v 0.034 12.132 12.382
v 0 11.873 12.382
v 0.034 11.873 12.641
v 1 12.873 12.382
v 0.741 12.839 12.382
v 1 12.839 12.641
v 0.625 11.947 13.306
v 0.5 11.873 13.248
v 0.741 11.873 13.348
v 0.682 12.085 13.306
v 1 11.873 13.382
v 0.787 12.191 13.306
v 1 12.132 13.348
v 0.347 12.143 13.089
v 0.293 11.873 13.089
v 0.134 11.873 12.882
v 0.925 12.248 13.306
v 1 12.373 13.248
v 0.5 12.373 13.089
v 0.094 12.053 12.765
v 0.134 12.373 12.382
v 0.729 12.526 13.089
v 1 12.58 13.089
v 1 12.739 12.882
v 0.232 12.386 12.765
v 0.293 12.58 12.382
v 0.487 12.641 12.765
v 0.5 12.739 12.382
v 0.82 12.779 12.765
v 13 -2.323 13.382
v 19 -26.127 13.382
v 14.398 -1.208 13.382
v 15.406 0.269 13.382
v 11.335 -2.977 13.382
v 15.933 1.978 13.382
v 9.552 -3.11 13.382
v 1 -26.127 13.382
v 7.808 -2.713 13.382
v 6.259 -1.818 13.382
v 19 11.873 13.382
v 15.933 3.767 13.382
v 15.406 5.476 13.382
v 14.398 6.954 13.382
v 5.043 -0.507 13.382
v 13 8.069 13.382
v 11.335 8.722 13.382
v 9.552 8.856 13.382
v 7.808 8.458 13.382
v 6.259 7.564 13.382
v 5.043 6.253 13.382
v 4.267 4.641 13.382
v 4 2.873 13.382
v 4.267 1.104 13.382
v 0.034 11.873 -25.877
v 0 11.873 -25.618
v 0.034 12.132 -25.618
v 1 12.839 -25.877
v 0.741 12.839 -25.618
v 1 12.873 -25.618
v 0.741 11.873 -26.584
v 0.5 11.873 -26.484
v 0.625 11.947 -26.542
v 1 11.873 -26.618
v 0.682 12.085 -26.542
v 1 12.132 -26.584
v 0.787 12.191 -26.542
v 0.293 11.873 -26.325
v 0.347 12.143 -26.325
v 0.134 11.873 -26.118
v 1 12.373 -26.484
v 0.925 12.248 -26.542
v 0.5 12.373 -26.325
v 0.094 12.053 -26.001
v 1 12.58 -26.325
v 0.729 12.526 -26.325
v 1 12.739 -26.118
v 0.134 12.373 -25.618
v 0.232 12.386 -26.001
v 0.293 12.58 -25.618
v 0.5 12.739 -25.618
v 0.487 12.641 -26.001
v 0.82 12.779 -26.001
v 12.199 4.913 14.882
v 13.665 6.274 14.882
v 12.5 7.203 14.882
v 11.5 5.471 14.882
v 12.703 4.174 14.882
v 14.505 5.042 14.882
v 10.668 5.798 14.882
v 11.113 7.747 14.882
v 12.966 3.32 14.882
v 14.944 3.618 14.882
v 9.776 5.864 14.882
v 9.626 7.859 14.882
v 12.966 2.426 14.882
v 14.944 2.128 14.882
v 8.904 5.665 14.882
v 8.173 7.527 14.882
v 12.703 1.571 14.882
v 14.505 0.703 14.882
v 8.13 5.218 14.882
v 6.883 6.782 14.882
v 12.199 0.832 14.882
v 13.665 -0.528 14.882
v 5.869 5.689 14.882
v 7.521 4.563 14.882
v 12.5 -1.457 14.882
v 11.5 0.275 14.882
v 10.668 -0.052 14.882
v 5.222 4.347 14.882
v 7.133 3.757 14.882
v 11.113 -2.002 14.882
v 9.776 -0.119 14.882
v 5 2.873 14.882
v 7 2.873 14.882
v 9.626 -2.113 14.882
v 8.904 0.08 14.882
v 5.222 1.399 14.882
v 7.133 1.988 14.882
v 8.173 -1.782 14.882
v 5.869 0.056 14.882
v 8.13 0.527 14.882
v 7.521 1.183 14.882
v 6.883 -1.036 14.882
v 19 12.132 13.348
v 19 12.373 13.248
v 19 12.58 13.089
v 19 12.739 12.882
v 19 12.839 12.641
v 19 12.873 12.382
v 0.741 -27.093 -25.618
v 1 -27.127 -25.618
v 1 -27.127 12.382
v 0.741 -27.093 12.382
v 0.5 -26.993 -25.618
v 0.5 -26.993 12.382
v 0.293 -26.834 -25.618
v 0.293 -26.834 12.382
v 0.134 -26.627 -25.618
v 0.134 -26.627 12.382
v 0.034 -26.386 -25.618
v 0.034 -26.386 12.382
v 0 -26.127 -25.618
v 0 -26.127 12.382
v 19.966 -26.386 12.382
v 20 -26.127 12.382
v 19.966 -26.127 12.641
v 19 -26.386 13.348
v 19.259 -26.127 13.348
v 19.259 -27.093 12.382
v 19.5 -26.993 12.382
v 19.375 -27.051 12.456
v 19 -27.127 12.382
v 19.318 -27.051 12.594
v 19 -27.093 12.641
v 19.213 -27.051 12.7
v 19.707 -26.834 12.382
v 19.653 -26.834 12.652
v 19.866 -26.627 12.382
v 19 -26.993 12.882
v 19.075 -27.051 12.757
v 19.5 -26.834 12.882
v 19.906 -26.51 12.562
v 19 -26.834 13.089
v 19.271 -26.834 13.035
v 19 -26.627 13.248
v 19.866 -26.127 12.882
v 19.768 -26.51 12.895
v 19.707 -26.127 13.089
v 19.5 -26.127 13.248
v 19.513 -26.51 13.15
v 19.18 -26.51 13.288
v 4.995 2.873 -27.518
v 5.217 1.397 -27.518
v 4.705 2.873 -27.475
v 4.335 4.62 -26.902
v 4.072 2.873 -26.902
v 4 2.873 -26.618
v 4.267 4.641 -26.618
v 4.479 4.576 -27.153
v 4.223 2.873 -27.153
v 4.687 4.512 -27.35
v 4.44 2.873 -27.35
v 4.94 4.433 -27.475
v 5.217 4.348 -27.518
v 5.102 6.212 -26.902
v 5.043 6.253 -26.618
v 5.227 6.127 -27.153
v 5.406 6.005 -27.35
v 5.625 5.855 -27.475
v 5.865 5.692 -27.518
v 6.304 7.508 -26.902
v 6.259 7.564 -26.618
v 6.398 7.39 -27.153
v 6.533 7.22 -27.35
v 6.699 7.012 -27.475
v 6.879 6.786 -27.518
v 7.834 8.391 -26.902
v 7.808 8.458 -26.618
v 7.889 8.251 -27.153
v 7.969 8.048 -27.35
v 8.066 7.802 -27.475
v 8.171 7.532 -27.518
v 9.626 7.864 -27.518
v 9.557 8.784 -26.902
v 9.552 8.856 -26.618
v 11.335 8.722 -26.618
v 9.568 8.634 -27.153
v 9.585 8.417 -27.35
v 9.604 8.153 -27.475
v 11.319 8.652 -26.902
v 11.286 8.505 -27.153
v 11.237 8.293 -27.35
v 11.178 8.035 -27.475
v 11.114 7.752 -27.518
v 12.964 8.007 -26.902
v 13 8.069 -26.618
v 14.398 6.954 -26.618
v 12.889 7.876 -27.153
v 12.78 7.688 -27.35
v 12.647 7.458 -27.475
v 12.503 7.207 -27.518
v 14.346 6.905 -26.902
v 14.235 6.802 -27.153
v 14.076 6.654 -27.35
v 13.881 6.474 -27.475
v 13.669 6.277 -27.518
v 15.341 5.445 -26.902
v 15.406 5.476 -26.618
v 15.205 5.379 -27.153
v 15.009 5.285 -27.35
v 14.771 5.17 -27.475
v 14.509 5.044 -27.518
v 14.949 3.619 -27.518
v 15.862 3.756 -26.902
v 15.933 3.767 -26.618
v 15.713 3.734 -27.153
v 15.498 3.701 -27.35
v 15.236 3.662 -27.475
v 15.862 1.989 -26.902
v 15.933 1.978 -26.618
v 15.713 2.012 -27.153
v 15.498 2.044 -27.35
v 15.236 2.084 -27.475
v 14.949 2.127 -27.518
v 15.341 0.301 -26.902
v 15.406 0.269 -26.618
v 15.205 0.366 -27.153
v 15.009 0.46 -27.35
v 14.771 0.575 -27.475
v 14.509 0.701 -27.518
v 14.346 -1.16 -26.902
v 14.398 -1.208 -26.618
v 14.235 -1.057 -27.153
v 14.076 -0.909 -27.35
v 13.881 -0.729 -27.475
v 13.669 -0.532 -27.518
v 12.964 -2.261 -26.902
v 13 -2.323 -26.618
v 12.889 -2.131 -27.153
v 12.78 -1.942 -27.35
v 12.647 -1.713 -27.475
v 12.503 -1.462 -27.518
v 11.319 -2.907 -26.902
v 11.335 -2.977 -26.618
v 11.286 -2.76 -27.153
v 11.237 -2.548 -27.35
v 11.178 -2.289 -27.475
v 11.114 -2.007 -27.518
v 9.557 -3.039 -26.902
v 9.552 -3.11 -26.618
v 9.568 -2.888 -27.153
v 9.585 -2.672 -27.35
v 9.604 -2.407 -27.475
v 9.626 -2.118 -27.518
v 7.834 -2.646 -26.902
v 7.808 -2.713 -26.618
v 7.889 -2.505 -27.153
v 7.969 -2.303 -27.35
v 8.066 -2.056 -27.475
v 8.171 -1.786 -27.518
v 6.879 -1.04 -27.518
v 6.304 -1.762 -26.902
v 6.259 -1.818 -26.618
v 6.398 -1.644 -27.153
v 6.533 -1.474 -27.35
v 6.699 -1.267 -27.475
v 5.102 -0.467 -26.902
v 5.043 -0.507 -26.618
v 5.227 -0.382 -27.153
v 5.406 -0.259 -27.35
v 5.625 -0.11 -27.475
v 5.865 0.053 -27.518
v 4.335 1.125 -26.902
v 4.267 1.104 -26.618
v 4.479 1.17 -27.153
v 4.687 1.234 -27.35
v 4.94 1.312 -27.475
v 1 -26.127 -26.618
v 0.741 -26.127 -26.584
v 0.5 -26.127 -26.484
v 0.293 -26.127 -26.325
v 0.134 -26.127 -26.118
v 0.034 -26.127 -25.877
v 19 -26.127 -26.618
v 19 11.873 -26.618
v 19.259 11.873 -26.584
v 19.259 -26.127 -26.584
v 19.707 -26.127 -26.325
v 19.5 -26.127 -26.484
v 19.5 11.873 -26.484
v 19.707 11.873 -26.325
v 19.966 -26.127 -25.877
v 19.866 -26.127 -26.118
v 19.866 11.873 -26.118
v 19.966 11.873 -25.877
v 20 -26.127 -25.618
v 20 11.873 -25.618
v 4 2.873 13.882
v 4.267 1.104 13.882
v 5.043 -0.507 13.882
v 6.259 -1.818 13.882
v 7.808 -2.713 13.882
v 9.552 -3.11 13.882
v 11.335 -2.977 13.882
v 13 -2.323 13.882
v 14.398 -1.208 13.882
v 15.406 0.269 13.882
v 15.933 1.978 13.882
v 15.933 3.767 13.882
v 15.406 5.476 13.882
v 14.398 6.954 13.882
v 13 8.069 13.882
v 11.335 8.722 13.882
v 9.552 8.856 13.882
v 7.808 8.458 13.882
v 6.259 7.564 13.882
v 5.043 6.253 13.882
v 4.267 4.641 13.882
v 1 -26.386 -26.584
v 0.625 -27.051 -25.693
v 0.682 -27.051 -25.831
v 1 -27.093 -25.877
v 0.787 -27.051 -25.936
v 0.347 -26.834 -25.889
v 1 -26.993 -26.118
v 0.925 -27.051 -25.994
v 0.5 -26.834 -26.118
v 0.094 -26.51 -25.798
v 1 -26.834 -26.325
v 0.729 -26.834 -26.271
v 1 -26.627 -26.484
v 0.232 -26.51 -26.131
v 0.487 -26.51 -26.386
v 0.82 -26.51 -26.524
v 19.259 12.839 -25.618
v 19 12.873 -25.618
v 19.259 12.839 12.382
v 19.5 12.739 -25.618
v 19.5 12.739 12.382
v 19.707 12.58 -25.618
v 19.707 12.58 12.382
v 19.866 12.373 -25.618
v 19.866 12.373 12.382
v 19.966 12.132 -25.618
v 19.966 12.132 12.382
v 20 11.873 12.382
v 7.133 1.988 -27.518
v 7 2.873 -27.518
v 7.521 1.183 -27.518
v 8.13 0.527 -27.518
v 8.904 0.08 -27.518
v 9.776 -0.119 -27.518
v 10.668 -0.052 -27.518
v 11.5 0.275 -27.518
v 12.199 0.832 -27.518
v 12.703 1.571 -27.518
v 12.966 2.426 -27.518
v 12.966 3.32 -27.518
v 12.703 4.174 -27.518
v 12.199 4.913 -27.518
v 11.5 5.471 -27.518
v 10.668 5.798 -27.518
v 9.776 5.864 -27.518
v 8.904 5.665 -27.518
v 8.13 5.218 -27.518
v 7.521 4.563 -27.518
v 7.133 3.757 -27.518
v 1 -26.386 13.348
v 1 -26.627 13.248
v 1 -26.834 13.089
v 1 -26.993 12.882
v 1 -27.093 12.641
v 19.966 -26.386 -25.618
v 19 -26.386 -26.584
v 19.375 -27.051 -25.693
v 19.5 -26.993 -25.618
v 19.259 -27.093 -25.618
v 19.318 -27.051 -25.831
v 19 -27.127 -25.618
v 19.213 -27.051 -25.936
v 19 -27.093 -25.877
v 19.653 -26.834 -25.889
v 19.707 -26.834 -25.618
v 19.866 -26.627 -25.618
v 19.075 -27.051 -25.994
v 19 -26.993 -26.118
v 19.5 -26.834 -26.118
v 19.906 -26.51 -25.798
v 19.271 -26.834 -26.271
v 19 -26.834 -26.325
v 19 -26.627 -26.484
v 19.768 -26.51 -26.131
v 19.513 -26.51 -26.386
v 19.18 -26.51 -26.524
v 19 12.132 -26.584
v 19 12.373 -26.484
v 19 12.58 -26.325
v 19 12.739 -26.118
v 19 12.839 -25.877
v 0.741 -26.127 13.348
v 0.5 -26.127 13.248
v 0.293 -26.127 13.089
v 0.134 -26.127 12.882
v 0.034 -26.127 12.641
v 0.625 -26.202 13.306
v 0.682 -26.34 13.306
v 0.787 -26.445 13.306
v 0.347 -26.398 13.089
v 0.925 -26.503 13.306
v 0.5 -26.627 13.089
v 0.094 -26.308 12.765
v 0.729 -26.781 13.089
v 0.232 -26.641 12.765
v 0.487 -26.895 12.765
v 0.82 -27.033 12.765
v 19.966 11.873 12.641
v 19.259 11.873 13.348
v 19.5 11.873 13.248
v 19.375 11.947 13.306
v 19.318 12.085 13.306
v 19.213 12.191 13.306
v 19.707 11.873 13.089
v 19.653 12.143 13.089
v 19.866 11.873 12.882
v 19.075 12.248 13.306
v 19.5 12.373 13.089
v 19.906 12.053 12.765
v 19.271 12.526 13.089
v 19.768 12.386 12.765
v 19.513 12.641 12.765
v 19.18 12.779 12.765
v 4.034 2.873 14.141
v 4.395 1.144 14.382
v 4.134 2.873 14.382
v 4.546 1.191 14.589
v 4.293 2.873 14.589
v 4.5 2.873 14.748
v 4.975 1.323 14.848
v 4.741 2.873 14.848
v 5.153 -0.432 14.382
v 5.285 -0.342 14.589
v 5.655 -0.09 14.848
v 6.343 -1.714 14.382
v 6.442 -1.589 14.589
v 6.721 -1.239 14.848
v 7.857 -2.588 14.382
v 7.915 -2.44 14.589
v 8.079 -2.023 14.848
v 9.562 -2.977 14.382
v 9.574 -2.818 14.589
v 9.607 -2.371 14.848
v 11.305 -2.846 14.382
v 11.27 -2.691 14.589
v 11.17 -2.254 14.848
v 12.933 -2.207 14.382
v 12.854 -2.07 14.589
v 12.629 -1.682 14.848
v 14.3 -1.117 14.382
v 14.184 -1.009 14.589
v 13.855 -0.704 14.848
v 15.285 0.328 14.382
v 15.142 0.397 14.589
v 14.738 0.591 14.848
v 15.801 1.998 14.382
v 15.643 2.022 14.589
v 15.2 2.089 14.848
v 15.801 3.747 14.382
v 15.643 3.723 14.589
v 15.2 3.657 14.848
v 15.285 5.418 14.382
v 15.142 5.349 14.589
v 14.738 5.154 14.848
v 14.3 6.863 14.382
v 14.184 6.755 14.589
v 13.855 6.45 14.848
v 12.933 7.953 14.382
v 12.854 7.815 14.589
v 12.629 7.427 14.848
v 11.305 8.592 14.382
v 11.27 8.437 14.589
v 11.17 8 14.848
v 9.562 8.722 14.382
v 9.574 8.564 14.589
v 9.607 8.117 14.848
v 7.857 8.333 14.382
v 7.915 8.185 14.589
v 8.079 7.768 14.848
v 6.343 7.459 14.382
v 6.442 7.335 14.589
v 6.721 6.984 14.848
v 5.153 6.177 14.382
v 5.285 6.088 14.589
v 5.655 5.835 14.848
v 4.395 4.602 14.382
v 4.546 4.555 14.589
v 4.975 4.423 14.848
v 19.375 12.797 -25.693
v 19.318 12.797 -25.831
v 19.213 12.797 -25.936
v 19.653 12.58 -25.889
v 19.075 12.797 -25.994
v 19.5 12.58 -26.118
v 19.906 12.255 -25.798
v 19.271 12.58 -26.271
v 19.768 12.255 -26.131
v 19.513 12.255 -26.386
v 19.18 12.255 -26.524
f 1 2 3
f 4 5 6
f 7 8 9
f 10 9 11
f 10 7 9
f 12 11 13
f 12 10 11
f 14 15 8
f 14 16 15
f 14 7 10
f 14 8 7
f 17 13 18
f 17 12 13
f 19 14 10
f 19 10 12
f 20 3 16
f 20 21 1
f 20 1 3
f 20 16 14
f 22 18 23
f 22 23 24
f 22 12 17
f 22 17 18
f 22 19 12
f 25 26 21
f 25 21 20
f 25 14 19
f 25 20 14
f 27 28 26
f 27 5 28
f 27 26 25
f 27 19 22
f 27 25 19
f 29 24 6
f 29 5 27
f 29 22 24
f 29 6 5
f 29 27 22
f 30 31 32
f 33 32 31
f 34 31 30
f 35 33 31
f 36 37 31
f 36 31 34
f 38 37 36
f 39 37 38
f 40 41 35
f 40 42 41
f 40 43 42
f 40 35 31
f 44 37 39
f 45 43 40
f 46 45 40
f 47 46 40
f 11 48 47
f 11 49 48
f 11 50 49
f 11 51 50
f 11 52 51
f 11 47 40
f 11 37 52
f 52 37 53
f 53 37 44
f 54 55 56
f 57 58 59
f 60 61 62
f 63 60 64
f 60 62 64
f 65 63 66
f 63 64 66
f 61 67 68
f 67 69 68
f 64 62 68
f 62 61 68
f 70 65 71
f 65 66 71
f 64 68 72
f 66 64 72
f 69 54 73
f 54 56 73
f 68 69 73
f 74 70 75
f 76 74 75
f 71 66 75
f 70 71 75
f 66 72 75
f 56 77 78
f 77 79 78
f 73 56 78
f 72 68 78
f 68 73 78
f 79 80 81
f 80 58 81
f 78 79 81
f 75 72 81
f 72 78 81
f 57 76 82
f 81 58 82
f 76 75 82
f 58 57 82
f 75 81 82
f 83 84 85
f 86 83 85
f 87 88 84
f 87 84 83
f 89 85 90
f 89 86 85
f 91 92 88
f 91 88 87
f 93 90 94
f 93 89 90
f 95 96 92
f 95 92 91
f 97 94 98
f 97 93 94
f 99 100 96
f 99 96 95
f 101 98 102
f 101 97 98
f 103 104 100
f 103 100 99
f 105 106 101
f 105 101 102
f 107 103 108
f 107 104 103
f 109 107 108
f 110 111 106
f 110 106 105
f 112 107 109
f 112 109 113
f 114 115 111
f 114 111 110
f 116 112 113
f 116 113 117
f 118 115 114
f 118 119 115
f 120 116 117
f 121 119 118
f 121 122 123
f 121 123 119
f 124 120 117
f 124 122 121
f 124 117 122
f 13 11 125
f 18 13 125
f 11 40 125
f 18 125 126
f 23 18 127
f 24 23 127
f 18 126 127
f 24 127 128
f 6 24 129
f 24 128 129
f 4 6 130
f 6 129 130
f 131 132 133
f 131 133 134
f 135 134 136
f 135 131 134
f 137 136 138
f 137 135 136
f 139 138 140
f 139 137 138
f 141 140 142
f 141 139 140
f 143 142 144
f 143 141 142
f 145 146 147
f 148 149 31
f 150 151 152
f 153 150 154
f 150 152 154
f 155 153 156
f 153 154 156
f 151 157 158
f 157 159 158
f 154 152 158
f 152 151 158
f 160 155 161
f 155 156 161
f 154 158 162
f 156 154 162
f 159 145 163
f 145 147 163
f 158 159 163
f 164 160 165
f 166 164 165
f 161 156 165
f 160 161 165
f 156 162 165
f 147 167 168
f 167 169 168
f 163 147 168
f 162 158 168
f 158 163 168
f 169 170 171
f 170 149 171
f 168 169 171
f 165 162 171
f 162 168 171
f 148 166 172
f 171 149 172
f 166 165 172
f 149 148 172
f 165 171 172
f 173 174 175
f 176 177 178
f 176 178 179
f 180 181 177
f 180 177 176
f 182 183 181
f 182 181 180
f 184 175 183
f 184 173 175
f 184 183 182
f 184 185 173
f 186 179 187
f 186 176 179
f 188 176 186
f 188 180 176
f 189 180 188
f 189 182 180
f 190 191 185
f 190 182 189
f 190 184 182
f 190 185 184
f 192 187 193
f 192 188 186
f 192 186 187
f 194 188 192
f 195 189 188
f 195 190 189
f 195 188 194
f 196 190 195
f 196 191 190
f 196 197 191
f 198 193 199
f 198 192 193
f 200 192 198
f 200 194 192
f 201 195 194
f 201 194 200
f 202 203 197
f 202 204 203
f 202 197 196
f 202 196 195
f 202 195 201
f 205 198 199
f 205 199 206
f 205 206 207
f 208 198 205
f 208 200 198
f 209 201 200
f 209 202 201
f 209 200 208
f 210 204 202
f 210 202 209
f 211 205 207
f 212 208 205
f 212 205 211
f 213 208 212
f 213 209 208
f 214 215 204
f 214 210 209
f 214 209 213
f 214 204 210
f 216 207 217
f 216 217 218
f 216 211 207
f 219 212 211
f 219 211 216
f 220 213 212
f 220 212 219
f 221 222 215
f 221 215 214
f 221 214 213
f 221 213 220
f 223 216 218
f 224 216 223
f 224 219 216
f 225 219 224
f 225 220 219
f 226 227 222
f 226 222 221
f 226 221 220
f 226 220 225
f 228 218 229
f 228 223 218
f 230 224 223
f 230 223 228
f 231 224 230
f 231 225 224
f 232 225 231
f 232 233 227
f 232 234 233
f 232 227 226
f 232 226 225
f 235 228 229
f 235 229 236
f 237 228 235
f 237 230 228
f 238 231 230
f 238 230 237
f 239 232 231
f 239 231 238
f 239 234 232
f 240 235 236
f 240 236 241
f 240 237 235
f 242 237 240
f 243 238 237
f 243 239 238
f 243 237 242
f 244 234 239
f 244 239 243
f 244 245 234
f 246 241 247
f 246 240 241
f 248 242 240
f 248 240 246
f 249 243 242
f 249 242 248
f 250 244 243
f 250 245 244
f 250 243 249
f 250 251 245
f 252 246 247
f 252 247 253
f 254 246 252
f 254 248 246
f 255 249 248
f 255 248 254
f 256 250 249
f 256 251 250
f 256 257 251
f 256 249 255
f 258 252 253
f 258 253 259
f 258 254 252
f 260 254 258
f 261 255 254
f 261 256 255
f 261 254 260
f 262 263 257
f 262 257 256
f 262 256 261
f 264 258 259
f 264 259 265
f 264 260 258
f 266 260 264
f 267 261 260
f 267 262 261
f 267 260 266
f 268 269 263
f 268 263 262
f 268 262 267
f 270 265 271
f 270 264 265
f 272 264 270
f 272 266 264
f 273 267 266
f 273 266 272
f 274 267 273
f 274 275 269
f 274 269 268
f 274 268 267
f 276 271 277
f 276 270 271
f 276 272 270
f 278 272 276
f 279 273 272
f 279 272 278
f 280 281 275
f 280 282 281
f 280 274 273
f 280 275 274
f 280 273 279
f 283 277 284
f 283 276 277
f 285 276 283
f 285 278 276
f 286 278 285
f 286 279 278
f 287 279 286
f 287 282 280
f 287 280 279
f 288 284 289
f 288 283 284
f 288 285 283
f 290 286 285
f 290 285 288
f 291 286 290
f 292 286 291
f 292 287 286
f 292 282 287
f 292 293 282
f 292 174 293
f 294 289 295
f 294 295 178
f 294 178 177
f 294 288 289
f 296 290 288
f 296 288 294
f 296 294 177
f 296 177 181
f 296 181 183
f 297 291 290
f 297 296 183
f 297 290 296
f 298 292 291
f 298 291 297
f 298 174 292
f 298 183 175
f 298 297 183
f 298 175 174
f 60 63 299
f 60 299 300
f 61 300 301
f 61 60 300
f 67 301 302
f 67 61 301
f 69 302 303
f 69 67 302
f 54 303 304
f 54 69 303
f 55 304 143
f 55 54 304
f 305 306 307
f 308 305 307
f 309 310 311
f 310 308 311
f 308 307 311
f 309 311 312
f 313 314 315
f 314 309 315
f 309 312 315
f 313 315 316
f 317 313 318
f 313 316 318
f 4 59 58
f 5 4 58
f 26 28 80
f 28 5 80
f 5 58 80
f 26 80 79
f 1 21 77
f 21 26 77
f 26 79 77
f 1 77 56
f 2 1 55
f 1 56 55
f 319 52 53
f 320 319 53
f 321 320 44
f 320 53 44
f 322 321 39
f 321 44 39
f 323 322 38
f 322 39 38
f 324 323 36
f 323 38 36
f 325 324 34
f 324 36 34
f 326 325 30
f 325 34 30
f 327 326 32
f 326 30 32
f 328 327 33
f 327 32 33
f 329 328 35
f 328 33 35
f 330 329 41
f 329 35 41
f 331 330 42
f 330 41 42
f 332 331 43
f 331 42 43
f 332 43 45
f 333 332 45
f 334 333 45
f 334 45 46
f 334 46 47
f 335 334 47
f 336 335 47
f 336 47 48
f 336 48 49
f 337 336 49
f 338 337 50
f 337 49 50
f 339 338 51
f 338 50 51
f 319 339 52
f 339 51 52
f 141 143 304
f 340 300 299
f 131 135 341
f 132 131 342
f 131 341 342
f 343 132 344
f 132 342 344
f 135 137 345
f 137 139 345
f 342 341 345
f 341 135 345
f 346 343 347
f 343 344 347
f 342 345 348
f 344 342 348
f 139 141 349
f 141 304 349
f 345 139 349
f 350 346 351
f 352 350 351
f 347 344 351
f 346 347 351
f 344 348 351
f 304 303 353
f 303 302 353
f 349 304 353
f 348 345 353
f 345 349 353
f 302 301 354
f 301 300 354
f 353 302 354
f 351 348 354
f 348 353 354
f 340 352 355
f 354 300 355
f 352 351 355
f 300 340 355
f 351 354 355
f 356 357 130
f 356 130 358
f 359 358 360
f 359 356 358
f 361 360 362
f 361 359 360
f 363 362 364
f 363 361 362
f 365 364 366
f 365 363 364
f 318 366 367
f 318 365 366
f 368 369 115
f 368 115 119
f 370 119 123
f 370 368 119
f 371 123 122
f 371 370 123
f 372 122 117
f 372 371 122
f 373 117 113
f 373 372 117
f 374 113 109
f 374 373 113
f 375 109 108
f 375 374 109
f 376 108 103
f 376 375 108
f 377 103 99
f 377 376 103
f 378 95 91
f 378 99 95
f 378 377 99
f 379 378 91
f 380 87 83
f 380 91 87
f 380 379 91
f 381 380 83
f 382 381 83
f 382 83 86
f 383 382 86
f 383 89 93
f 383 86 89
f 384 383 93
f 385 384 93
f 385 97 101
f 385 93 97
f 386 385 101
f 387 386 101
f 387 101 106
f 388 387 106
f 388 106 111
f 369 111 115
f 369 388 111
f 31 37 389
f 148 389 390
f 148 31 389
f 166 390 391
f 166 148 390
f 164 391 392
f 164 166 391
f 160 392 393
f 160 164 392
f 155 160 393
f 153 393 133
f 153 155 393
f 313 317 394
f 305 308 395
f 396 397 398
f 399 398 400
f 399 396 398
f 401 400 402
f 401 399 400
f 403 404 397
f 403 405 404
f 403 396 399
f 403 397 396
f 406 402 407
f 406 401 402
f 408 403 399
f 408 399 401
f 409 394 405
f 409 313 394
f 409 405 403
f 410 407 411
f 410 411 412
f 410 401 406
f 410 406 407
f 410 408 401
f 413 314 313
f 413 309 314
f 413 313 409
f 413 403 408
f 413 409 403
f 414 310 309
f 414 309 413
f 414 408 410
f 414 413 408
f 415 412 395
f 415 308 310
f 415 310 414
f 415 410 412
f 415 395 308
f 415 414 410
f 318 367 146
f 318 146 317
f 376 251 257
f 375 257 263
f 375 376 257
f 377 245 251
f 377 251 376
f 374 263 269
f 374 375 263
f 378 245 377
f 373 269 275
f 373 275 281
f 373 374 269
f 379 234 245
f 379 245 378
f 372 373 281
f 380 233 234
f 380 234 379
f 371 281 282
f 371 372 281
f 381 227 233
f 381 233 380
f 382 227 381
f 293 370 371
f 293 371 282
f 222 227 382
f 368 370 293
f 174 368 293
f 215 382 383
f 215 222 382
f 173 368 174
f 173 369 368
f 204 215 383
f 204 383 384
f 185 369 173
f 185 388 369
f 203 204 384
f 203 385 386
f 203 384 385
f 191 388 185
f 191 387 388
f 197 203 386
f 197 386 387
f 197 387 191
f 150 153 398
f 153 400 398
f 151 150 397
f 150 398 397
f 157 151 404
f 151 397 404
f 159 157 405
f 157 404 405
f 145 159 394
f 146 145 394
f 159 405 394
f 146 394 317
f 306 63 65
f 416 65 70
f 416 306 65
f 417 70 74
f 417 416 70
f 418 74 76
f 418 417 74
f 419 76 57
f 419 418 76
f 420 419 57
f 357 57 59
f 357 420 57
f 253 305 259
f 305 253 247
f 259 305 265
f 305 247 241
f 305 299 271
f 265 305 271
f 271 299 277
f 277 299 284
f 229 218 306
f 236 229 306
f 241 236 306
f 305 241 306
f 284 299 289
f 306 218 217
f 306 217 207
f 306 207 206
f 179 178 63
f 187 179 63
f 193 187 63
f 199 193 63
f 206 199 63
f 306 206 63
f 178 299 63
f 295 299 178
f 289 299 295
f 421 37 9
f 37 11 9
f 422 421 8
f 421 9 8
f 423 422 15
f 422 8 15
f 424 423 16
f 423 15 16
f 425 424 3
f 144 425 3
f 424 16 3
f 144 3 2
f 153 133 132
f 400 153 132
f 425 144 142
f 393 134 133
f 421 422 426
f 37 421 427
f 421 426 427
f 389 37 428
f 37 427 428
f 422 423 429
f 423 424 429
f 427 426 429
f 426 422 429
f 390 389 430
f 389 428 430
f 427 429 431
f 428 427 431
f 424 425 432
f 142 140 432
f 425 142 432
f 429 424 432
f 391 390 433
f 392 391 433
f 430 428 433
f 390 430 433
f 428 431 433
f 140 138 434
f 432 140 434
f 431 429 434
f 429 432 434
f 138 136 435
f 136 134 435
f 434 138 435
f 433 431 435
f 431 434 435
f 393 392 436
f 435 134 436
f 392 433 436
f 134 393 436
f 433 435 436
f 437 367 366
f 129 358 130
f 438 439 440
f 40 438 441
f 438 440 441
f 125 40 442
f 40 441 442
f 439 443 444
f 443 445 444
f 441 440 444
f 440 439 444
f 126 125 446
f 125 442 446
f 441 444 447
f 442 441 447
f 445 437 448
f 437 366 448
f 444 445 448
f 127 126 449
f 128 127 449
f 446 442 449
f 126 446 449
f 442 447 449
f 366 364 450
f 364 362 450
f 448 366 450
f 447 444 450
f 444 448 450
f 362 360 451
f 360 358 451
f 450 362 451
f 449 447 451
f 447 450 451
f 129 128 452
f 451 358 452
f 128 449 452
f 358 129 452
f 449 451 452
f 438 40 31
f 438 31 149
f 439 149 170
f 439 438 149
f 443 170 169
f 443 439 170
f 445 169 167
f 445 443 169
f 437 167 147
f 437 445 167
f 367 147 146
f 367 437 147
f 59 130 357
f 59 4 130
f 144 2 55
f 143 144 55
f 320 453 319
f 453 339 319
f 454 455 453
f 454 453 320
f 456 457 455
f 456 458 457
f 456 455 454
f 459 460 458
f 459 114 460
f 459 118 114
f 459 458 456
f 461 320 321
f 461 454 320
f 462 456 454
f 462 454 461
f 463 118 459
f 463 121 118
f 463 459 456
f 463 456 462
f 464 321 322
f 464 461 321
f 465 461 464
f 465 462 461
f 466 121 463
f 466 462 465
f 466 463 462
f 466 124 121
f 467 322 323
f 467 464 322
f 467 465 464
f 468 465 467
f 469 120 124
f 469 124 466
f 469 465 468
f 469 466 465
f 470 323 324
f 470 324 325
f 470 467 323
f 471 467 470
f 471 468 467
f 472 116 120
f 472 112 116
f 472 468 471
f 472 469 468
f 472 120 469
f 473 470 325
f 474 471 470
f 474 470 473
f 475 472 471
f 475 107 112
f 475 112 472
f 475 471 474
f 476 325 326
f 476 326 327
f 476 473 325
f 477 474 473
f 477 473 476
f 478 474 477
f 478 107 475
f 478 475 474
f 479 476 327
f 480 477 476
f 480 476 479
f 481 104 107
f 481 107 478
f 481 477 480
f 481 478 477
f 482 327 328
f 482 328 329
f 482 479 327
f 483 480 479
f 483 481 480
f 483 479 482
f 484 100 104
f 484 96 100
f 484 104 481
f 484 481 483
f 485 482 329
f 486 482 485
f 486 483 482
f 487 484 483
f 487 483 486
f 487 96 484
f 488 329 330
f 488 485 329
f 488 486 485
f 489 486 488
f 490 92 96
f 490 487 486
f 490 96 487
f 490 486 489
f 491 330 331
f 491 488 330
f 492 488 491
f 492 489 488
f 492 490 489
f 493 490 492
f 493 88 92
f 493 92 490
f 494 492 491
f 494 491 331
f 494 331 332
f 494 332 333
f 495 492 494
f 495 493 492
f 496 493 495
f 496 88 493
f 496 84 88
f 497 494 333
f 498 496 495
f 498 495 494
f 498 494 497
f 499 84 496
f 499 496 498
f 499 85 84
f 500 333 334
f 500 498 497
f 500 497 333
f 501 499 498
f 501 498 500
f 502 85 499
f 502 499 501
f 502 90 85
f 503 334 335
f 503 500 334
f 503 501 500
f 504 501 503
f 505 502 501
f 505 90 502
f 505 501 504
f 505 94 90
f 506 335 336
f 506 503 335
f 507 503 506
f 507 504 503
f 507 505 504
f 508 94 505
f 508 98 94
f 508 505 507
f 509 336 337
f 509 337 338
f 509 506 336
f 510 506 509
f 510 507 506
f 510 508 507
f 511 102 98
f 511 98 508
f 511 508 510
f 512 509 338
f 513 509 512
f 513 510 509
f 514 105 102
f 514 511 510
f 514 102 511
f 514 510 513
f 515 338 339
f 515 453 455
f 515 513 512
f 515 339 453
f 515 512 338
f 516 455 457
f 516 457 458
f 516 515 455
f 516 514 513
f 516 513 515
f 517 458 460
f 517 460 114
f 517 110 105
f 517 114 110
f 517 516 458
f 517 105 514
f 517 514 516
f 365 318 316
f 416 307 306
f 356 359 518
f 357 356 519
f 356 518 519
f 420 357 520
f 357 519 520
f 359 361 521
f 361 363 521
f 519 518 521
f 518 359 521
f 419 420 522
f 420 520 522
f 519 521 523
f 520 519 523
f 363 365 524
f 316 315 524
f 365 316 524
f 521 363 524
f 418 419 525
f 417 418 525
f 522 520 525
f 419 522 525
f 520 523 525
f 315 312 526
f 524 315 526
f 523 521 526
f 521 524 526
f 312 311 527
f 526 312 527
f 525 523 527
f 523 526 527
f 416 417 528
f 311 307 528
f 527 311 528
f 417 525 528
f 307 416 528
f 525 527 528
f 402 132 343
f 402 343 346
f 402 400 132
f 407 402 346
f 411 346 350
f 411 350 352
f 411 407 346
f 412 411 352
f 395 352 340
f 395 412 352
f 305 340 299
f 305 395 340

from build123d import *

# Parameters (mm, degrees)
SKETCH1_W               = 40
SKETCH1_H               = 40
BOSS_EXTRUDE1_DEPTH     = 20
FILLET1_R               = 1
SKETCH2_R               = 6
BOSS_EXTRUDE2_DEPTH     = 1.5
FILLET2_R               = 1
BOSS_EXTRUDE4_START     = 0.9
SKETCH4_R               = 6
BOSS_EXTRUDE4_DEPTH     = 0.9
FILLET3_R               = 1
CUT_EXTRUDE2_DEPTH      = 55.163169457
CUT_EXTRUDE2_DEPTH_BACK = 55.163169457
SKETCH3_R               = 3


with BuildPart() as part:
    # Sketch1 → Boss-Extrude1 (new body)
    with BuildSketch(Plane(origin=(0, 0, 0), x_dir=(0, 0, -1), z_dir=(1, 0, 0))):
        with Locations((6.618181818, -7.127272727)):
            Rectangle(SKETCH1_W, SKETCH1_H)
    extrude(amount=BOSS_EXTRUDE1_DEPTH)

    # Fillet1
    fillet1_edges = [part.edges().sort_by_distance(p)[0] for p in [
        (20, -7.127272727, -26.618181818),
        (20, 12.872727273, -6.618181818),
        (20, -7.127272727, 13.381818182),
        (0, 12.872727273, -6.618181818),
        (0, -7.127272727, -26.618181818),
        (0, -27.127272727, -6.618181818),
        (0, -7.127272727, 13.381818182),
        (20, -27.127272727, -6.618181818),
        (10, 12.872727273, 13.381818182),
        (10, 12.872727273, -26.618181818),
        (10, -27.127272727, -26.618181818),
        (10, -27.127272727, 13.381818182),
    ]]
    fillet(fillet1_edges, radius=FILLET1_R)

    # Sketch2 → Boss-Extrude2 (add)
    with BuildSketch(Plane.XY.offset(13.381818182)):
        with Locations(Location((10, 2.872727273, 0), (0, 0, 180))):
            Circle(SKETCH2_R)
    extrude(amount=BOSS_EXTRUDE2_DEPTH)

    # Fillet2
    fillet2_edges = [part.edges().sort_by_distance(p)[0] for p in [
        (16, 2.872727273, 14.881818182),
    ]]
    fillet(fillet2_edges, radius=FILLET2_R)

    # Sketch4 → Boss-Extrude4 (add)
    with BuildSketch(Plane(origin=(0, 0, -26.618181818), x_dir=(-1, 0, 0), z_dir=(0, 0, -1)).offset(BOSS_EXTRUDE4_START)):
        with Locations((-10, 2.872727273)):
            Circle(SKETCH4_R)
    extrude(amount=-BOSS_EXTRUDE4_DEPTH)

    # Fillet3
    # the kernel refuses this fillet: 1 mm, written as the material it takes off along each edge
    with BuildSketch(Plane(origin=(10, 2.872727273, -27.518181818), x_dir=(-1, 0, 0), z_dir=(0, -1, 0))) as fillet3_piece_1:
        with BuildLine():
            CenterArc((5.005012563, -1), FILLET3_R, 5.739170477, 84.260829523)
            Line((5.005012563, 0), (5.005012563, 0.02))
            Line((5.005012563, 0.02), (6, 0.02))
            Line((6, 0.02), (6.02, 0))
            ThreePointArc((6.02, 0), (6.02, -0.45), (6.019899749, -0.898))
            Line((6.019899749, -0.898), (6, -0.9))
        make_face()
    revolve(axis=Axis((10, 2.872727273, -27.518181818), (0, 0, -1)), mode=Mode.SUBTRACT)

    # Sketch3 → Cut-Extrude2 (cut, two sides: drawn at the far end of the back side and taken through both)
    with BuildSketch(Plane.XY.offset(14.881818182).offset(-CUT_EXTRUDE2_DEPTH_BACK)):
        with Locations(Location((10, 2.872727273, 0), (0, 0, 180))):
            Circle(SKETCH3_R)
    extrude(amount=CUT_EXTRUDE2_DEPTH + CUT_EXTRUDE2_DEPTH_BACK, mode=Mode.SUBTRACT)


solid = part.part
